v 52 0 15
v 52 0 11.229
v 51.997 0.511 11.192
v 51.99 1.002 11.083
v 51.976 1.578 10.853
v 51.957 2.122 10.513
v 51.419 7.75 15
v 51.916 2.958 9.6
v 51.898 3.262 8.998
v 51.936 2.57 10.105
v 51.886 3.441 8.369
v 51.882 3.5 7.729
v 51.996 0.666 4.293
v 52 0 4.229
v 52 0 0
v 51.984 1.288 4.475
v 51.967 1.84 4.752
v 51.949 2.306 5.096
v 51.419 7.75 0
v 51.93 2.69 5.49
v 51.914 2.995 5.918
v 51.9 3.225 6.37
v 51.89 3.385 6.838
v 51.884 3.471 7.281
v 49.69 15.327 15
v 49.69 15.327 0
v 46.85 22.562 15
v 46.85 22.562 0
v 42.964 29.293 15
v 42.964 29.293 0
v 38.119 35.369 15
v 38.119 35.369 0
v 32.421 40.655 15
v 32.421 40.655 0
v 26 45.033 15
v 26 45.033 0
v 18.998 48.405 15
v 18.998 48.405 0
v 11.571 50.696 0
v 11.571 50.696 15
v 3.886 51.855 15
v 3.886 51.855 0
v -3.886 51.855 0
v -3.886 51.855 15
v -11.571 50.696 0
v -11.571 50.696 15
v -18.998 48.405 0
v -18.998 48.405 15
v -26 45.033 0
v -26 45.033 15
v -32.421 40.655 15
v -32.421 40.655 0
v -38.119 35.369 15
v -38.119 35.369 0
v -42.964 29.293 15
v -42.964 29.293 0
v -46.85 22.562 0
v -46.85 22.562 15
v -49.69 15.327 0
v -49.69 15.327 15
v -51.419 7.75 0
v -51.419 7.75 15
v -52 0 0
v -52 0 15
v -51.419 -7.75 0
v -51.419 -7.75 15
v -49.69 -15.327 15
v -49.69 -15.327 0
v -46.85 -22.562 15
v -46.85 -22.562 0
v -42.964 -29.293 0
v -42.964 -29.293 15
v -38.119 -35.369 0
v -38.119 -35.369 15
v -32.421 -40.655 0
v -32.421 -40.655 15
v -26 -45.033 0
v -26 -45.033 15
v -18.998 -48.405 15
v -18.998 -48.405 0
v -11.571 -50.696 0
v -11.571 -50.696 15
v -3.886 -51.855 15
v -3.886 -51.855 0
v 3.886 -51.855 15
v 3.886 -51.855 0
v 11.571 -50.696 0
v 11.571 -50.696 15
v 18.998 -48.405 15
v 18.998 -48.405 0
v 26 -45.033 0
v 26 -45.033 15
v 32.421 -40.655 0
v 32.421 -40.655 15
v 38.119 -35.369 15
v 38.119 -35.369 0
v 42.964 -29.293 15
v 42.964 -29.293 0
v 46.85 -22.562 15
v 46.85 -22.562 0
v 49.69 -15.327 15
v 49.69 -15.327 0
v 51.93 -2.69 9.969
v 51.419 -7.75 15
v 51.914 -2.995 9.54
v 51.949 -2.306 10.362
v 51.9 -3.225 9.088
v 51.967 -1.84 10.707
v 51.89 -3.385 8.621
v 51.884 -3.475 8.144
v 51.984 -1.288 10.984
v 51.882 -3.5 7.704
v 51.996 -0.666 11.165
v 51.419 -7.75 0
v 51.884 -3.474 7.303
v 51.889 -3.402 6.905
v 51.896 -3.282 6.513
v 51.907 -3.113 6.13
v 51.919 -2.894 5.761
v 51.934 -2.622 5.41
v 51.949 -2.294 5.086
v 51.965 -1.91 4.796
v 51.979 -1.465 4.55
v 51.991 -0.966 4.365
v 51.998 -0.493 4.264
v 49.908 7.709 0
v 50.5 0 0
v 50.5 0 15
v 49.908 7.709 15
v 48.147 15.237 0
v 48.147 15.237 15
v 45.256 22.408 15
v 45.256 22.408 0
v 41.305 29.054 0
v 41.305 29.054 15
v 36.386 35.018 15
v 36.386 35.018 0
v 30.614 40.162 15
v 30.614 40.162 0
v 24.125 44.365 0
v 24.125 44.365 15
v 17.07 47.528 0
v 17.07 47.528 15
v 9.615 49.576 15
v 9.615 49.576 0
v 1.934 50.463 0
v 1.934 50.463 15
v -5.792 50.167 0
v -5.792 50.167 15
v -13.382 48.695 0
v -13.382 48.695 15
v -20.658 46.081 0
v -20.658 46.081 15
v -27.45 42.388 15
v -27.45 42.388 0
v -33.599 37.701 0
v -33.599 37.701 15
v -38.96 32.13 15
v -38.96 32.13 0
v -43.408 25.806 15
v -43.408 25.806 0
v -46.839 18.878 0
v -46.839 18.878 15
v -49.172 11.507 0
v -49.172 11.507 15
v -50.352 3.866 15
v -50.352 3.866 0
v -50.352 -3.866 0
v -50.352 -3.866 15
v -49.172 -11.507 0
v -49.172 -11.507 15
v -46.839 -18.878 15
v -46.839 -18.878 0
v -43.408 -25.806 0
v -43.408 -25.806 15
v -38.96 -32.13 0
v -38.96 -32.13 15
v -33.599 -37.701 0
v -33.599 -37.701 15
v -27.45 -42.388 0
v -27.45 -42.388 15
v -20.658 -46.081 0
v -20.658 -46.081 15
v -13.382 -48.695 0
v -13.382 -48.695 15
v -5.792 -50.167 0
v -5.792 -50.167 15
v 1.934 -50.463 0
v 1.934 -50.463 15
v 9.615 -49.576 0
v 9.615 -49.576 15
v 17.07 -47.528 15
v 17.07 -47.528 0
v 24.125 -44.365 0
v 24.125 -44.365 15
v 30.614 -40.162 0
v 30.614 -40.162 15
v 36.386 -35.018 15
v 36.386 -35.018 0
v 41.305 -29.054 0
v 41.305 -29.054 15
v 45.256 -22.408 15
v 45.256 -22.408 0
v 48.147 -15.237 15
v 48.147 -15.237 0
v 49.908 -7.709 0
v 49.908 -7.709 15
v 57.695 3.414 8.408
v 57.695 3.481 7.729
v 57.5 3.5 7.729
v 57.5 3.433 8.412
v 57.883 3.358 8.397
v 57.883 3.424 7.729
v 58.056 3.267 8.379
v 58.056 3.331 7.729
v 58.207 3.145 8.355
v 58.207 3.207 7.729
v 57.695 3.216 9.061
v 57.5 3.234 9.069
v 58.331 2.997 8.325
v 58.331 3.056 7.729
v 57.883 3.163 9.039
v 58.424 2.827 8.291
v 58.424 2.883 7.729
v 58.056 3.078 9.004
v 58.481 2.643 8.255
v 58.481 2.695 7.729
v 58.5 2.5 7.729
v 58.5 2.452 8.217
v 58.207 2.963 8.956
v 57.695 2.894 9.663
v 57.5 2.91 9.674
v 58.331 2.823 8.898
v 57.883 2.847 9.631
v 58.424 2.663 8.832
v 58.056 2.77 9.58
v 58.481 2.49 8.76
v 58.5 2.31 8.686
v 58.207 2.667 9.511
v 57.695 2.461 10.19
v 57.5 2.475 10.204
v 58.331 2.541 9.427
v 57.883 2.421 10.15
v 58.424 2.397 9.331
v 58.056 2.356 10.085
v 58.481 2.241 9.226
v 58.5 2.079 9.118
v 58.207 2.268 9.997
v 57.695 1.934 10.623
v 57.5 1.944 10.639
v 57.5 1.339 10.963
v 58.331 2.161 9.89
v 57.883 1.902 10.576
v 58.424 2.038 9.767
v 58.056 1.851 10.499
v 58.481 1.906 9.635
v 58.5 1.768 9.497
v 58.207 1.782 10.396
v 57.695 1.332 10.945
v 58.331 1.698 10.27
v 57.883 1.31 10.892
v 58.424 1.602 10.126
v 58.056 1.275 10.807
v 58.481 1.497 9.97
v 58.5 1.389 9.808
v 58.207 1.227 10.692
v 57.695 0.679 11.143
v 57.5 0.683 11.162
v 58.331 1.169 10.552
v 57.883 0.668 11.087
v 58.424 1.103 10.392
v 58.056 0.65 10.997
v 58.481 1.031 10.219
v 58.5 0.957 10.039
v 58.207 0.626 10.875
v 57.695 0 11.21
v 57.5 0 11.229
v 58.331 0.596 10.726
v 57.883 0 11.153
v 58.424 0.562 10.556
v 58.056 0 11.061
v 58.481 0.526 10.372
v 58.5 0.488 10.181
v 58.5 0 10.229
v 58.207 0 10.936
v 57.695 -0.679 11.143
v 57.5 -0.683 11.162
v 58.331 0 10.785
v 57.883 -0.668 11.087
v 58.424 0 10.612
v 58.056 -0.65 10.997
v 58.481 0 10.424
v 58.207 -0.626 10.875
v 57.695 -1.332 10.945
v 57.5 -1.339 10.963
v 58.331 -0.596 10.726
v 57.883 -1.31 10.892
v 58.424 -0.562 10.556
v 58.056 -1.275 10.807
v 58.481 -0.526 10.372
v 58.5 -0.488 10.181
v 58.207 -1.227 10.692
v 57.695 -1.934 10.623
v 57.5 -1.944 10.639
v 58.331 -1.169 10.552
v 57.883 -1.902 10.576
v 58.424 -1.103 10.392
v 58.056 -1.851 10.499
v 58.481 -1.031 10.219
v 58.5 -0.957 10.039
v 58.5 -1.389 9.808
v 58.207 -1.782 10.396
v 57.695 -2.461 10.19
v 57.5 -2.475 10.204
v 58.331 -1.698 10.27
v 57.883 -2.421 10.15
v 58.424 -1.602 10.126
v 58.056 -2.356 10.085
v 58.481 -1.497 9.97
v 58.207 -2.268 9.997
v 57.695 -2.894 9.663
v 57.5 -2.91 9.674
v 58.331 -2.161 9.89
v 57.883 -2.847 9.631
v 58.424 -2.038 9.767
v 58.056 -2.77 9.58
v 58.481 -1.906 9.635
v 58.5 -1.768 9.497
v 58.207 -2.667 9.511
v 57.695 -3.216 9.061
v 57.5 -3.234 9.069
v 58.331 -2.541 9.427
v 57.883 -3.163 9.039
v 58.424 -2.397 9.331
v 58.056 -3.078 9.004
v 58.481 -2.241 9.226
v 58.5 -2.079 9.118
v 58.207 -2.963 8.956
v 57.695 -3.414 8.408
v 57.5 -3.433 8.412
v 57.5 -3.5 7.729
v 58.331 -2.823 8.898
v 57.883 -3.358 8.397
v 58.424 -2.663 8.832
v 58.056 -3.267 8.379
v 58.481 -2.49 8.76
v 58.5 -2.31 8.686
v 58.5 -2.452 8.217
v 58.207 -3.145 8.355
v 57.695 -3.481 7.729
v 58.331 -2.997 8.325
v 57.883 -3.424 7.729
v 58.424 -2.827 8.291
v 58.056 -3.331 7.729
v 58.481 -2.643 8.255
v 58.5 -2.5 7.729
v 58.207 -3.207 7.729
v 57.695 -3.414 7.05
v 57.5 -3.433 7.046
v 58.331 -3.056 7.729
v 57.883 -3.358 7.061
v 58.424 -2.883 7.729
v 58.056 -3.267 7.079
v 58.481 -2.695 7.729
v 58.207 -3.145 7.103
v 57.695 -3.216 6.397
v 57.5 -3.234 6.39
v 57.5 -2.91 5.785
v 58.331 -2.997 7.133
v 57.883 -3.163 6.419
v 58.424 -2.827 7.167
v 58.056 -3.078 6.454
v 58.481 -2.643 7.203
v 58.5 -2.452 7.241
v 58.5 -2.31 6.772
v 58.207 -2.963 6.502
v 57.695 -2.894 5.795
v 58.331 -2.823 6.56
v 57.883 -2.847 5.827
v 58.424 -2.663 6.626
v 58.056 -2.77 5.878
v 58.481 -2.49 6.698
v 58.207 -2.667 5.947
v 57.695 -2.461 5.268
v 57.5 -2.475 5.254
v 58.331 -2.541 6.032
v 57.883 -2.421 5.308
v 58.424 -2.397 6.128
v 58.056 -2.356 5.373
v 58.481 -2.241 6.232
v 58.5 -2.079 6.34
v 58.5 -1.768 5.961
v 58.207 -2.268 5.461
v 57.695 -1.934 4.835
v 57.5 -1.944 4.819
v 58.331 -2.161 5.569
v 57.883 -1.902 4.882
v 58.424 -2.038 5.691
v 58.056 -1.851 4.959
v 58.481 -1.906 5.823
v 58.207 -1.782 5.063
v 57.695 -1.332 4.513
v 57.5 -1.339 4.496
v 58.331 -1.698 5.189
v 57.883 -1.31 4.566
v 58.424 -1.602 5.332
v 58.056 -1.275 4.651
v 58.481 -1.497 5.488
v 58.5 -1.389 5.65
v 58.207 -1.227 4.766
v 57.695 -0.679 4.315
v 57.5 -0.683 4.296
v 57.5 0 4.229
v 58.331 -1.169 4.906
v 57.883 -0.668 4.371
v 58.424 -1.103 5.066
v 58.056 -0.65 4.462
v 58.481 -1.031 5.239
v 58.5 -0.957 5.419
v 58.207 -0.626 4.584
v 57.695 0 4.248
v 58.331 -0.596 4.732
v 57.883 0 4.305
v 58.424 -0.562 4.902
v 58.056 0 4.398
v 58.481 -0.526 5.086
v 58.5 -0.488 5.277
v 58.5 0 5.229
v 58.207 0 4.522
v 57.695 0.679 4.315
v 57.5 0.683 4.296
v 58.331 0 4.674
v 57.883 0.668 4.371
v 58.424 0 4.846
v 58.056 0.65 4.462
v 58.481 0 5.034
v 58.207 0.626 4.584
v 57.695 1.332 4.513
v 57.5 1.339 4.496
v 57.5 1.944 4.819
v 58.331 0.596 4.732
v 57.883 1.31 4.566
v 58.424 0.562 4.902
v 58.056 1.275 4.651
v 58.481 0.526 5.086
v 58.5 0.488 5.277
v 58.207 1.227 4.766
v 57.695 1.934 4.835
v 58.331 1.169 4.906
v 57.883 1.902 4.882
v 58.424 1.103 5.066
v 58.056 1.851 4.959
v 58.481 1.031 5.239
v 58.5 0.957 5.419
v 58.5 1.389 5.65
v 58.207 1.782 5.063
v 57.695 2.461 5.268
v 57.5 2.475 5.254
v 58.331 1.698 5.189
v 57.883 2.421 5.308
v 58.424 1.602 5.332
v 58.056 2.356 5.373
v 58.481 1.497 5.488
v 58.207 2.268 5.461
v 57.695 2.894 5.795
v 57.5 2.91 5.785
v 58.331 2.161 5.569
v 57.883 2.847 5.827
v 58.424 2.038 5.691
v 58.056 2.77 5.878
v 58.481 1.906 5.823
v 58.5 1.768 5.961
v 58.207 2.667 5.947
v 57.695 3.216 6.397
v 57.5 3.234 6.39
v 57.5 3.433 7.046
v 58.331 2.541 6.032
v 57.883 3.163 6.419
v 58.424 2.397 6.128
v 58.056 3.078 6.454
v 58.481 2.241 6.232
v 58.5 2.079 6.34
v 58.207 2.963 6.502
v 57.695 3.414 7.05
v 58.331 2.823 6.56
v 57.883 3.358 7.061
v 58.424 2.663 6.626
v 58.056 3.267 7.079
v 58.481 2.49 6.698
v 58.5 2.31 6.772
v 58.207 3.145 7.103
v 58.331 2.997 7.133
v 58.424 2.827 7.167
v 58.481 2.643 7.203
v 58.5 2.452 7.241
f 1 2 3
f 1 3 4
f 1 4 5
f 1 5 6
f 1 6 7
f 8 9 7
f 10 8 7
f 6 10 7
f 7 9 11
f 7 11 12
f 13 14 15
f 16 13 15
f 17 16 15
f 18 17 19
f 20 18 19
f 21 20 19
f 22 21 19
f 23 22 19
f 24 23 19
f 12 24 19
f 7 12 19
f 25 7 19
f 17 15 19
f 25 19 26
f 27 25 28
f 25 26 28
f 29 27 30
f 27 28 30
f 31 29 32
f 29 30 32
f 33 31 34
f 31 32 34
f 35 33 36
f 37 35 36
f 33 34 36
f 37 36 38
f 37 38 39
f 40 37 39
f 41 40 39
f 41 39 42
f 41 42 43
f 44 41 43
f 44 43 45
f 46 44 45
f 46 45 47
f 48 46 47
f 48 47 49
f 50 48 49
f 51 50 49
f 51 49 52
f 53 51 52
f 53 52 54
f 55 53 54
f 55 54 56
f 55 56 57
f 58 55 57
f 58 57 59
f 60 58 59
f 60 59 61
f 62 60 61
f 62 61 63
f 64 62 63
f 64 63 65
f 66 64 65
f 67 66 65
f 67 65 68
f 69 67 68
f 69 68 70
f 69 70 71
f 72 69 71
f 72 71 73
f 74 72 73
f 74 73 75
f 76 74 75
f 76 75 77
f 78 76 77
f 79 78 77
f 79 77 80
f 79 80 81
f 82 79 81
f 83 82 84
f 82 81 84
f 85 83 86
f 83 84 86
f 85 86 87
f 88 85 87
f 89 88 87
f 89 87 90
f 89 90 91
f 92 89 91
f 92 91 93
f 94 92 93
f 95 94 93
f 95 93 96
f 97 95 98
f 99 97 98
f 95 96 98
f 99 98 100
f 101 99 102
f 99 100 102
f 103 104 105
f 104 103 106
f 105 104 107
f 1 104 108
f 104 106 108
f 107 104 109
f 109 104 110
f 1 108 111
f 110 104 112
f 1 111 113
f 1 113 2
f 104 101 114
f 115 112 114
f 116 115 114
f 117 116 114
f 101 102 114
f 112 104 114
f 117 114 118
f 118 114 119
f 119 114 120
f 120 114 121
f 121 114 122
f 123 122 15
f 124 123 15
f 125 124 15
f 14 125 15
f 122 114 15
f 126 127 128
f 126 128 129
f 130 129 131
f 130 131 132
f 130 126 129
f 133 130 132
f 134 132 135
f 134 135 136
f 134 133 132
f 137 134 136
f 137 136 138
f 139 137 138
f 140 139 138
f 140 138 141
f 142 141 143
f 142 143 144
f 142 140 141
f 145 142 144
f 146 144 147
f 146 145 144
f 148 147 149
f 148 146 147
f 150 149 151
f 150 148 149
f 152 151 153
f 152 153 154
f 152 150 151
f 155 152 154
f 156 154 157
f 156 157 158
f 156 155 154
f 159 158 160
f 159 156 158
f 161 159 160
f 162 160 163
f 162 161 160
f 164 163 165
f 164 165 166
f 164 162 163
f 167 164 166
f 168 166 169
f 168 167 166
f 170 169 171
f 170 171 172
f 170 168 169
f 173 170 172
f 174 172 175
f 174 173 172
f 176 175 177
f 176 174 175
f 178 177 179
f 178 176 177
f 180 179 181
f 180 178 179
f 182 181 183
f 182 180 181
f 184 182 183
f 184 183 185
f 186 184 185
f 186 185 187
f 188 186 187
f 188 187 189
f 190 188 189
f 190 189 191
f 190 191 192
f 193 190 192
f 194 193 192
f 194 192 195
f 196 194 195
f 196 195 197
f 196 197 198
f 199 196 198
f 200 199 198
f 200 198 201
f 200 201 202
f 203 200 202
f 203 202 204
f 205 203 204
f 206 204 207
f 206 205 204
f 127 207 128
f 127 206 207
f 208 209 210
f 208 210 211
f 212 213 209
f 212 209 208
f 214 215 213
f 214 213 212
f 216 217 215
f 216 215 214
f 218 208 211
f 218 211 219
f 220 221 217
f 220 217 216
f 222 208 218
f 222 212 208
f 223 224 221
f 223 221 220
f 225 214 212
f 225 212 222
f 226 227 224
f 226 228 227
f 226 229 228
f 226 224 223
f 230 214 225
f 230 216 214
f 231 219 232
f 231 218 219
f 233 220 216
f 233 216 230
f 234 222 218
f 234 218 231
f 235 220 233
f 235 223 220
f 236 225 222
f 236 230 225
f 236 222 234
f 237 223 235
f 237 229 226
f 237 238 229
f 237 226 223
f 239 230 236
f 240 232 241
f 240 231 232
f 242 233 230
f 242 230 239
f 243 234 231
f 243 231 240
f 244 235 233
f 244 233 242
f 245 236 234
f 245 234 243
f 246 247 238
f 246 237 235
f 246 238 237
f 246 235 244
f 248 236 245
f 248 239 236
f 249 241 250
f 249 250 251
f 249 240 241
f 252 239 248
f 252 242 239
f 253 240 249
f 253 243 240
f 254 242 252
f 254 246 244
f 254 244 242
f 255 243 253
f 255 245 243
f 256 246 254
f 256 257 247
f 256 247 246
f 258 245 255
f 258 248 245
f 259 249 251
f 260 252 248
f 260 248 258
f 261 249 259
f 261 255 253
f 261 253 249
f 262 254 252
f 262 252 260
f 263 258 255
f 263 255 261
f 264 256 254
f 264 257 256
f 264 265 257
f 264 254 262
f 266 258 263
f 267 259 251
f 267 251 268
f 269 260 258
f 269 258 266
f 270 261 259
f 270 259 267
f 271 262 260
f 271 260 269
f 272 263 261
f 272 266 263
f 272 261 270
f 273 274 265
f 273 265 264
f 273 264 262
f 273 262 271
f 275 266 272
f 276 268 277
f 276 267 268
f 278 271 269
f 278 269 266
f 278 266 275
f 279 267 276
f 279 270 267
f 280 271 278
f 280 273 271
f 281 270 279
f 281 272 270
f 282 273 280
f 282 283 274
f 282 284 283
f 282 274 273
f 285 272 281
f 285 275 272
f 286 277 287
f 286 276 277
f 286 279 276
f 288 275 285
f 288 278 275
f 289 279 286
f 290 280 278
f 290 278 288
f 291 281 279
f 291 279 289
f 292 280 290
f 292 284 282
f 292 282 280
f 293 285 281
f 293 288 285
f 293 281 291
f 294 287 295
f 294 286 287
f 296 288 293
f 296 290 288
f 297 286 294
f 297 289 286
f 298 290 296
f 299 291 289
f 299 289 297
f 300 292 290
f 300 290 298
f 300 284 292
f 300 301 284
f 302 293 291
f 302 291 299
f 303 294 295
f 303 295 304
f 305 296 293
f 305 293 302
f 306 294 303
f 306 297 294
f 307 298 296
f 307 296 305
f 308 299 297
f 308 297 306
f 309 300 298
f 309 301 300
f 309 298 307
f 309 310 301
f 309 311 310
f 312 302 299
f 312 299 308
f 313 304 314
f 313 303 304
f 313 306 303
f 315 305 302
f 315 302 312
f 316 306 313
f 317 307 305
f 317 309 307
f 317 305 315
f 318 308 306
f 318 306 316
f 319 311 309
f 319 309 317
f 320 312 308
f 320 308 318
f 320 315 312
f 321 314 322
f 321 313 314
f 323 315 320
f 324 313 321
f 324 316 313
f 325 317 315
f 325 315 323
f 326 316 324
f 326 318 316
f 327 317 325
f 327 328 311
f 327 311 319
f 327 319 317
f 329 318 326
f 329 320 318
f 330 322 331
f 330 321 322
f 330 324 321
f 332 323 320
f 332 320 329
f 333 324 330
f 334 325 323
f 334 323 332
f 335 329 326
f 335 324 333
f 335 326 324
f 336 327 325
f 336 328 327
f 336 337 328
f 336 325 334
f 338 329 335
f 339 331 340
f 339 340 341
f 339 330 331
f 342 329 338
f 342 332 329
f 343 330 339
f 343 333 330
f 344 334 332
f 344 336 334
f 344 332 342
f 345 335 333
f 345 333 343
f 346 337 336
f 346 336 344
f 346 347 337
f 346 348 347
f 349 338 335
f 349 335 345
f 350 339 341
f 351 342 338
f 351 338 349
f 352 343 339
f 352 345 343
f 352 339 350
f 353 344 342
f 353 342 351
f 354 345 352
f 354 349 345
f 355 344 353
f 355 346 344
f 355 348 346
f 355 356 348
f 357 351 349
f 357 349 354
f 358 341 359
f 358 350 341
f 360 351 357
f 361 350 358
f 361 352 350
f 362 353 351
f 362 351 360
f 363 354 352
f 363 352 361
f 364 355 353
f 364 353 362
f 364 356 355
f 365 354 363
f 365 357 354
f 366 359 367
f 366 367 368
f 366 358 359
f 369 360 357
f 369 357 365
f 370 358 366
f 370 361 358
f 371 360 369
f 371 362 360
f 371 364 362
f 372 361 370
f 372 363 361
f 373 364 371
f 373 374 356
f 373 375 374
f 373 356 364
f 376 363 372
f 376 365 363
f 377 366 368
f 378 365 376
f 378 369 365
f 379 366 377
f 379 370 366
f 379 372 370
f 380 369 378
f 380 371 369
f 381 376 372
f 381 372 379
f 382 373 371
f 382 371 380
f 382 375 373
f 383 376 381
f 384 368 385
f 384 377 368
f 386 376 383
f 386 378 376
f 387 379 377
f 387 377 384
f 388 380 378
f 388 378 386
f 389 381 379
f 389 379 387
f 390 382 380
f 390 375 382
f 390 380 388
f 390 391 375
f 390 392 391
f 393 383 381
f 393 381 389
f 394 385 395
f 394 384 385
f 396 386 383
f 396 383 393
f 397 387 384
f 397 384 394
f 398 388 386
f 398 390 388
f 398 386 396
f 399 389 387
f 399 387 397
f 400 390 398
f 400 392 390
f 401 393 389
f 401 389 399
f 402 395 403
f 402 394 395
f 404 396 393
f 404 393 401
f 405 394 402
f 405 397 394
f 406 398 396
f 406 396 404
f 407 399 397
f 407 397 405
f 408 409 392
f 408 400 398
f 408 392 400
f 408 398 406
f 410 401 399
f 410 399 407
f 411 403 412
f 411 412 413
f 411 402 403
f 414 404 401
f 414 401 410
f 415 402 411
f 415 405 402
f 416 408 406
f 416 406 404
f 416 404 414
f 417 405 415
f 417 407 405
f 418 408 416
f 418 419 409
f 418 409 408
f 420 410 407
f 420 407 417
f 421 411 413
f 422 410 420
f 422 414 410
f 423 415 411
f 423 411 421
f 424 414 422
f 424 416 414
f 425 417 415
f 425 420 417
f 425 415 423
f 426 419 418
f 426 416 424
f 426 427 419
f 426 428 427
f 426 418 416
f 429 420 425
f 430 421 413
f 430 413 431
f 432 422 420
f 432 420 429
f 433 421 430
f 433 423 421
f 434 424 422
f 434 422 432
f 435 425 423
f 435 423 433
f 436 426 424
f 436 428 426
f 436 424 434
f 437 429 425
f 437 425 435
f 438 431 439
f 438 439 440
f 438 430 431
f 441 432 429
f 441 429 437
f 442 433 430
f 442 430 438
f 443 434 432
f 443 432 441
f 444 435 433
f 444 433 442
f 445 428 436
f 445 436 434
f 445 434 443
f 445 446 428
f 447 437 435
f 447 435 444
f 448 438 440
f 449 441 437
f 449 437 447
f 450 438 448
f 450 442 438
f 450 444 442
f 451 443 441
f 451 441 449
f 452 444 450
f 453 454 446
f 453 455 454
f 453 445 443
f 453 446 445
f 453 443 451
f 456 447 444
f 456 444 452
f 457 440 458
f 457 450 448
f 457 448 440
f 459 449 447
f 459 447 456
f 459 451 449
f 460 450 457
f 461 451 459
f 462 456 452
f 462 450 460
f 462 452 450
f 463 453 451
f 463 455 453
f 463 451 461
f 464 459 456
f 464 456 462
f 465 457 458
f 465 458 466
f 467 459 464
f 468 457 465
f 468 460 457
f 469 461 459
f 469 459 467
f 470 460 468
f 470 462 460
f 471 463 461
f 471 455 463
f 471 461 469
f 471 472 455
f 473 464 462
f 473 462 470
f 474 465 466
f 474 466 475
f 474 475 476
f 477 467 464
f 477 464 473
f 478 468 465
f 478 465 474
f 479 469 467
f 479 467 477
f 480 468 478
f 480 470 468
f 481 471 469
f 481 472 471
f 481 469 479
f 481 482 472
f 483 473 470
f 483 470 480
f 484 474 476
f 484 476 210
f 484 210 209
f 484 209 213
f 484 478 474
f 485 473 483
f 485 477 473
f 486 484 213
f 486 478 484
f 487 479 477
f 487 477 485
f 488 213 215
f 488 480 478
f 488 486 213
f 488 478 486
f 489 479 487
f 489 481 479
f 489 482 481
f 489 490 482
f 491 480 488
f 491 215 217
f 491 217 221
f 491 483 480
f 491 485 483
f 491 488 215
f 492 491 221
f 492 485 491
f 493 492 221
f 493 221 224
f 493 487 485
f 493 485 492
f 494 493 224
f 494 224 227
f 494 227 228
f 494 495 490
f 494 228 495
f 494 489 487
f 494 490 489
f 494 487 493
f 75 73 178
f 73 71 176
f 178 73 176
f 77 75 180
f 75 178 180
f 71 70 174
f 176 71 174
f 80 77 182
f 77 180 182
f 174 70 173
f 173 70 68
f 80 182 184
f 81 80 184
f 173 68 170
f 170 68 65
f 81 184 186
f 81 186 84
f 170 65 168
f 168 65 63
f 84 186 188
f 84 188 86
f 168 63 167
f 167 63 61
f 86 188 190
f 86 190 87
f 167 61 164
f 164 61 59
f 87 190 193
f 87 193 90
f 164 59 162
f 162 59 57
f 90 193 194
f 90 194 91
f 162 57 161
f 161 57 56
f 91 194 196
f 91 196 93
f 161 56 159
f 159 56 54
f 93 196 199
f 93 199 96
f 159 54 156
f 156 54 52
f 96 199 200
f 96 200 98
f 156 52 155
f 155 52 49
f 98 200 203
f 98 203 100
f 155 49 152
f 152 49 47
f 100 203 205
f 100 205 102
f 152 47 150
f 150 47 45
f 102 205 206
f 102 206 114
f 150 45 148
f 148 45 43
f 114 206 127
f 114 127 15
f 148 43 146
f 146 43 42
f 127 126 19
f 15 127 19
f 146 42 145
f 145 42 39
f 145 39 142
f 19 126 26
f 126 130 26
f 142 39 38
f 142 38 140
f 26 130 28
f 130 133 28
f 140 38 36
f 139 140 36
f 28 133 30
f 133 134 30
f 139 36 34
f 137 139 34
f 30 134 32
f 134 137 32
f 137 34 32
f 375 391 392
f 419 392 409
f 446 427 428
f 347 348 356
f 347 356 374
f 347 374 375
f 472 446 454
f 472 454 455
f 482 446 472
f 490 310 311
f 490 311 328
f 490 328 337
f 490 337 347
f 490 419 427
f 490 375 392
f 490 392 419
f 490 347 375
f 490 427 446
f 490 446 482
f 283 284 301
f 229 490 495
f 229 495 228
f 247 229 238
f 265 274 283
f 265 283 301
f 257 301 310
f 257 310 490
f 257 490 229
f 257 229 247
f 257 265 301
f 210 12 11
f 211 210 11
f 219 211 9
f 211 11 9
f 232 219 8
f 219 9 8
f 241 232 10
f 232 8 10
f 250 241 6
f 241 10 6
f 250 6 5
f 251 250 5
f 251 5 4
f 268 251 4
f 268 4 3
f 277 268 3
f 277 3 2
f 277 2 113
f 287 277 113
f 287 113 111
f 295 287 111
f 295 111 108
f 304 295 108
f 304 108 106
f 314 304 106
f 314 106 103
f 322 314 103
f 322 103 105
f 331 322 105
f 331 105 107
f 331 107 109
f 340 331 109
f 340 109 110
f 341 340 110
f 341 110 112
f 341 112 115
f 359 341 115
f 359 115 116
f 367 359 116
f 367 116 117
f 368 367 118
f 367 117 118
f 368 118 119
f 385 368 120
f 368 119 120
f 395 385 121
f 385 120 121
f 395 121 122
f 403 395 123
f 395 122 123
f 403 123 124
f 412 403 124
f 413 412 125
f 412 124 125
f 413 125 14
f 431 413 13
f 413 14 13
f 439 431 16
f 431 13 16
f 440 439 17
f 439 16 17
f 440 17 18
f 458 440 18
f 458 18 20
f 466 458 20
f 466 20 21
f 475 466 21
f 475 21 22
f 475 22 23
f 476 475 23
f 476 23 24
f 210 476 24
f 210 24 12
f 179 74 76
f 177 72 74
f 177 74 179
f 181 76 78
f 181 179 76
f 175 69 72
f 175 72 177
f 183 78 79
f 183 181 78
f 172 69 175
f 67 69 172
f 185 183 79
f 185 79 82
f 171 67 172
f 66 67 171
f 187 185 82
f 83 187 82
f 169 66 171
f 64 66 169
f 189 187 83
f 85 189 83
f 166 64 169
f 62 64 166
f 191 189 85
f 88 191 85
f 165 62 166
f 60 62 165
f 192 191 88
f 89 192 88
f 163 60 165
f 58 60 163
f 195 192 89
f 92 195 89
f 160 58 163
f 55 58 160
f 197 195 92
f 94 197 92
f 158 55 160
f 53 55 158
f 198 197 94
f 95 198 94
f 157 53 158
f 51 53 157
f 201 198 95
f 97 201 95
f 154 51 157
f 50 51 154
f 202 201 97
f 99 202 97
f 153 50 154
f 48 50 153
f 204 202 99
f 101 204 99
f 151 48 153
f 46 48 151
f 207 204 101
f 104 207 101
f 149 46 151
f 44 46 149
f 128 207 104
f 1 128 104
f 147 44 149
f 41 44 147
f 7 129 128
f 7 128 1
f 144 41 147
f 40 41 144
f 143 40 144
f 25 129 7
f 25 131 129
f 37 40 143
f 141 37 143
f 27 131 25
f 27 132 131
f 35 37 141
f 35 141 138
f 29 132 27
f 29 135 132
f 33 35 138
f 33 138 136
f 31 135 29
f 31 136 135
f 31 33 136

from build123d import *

# Parameters (mm, degrees)
F0_R     = 52
F0_R_2   = 50.5
F1_DEPTH = 15
F3_R     = 3.5
F4_DEPTH = 7
F5_R     = 1


with BuildPart() as f1:
    # F0 (on Top) → F1 (new body)
    with BuildSketch(Plane.XY):
        Circle(F0_R)
        Circle(F0_R_2, mode=Mode.SUBTRACT)
    extrude(amount=F1_DEPTH)

    # F3 (on offset) → F4 (join)
    with BuildSketch(Plane.YZ.offset(51.5)):
        with Locations((0, 7.729115)):
            Circle(F3_R)
    extrude(amount=F4_DEPTH)

    # F5
    f5_edges = [f1.edges().sort_by_distance(p)[0] for p in [
        (58.5, -3.5, 7.729115),
    ]]
    fillet(f5_edges, radius=F5_R)


solid = f1.part
